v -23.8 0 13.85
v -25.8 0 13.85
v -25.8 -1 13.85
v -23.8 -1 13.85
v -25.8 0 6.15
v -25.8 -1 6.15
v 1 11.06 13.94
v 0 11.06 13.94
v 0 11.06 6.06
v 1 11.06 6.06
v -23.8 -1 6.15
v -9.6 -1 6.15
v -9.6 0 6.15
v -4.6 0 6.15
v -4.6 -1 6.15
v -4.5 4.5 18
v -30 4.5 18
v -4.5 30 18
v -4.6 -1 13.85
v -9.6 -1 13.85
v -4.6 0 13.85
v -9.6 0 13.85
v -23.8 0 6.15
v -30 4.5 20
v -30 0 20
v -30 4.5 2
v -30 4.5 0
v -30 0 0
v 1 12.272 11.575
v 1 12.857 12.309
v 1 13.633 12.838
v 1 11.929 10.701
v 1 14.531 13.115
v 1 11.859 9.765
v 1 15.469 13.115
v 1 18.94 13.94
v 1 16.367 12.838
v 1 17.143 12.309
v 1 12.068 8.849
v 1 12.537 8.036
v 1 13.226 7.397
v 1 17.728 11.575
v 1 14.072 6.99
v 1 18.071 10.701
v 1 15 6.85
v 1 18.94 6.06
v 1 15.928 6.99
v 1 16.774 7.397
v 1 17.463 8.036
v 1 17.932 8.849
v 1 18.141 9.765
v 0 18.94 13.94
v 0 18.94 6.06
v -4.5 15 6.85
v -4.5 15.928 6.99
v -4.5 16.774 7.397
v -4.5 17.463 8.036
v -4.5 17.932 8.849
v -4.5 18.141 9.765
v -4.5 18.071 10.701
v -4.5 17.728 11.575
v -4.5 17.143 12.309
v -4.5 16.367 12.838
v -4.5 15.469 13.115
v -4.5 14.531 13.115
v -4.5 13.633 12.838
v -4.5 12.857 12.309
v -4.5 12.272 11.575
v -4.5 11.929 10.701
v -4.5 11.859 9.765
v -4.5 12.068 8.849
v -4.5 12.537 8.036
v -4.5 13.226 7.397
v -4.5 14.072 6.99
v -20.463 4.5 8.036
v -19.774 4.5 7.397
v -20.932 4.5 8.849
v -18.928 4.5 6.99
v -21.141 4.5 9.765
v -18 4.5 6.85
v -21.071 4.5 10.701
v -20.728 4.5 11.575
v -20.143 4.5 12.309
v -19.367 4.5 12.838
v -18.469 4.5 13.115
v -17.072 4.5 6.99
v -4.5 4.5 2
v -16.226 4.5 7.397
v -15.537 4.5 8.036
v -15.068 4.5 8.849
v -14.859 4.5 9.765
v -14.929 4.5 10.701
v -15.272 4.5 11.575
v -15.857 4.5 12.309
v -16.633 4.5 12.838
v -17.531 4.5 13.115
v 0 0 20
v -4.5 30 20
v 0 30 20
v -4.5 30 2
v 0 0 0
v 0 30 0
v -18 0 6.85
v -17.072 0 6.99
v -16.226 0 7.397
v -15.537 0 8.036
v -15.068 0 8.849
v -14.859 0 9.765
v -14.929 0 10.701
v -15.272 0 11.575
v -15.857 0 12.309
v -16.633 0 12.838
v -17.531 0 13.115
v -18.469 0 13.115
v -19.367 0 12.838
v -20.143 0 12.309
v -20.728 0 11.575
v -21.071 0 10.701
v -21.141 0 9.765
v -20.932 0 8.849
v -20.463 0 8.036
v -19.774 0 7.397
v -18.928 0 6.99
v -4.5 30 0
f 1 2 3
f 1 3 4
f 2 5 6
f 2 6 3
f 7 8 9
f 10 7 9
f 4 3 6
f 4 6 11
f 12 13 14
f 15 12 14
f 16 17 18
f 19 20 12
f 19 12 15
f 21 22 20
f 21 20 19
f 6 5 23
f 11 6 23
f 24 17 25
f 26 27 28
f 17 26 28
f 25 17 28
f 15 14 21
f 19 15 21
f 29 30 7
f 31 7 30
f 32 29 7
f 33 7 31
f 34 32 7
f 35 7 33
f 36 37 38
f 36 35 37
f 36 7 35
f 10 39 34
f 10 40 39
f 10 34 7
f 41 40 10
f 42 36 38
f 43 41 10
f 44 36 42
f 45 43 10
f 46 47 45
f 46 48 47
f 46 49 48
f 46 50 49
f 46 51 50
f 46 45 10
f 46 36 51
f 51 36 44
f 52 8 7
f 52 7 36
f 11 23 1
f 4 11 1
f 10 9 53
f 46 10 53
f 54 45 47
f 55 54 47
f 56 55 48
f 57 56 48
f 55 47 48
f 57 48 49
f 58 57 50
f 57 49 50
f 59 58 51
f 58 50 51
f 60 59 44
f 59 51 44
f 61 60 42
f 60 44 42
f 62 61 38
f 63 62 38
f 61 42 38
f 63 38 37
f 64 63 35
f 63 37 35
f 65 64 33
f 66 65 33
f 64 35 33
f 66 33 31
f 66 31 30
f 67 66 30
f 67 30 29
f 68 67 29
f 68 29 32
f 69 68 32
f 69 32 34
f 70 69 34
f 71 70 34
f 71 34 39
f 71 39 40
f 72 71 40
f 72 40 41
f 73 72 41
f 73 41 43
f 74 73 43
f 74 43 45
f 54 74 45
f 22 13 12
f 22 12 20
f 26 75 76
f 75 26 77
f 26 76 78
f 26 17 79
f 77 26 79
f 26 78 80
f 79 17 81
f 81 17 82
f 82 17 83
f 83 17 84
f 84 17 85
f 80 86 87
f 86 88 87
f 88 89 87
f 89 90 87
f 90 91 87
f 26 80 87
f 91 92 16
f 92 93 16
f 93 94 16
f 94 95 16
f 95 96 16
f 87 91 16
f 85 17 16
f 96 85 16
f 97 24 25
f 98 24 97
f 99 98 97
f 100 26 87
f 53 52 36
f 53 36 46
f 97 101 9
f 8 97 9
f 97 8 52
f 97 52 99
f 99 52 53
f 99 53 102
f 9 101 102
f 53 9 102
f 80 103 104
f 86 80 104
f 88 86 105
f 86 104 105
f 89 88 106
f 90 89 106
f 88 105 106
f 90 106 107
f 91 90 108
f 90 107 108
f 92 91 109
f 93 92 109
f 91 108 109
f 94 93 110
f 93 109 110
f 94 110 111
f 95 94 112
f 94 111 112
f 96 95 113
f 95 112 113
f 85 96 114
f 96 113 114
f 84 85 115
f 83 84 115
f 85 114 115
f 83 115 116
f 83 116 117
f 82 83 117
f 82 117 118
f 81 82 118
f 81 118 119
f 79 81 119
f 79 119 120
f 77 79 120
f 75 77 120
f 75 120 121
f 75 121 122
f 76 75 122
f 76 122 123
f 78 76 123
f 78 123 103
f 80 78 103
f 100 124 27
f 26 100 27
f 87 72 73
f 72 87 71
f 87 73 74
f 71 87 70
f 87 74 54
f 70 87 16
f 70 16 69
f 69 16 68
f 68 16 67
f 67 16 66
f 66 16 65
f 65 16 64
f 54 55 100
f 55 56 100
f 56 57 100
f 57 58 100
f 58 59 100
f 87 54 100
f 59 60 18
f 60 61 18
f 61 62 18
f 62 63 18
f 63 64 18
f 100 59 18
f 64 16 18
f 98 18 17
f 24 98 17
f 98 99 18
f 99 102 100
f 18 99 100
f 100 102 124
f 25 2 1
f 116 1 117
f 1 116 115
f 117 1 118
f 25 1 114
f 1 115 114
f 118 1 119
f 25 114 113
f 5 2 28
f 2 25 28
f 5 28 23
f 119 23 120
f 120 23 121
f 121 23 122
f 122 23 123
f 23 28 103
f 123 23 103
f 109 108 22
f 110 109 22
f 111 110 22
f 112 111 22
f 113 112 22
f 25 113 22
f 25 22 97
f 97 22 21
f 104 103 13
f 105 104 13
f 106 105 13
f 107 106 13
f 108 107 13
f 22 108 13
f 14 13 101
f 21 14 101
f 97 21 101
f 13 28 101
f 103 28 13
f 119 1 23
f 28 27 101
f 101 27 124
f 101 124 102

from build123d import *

# Parameters (mm, degrees)
BOSS_EXTRUDE1_DEPTH = 20
CUT_EXTRUDE1_START  = -2
CUT_EXTRUDE1_DEPTH  = 16
SKETCH3_W           = 7.88
SKETCH3_H           = 7.88
BOSS_EXTRUDE2_DEPTH = 1
SKETCH4_R           = 3.15
CUT_EXTRUDE2_DEPTH  = 48.549973712
SKETCH5_W           = 2
SKETCH5_H           = 7.7
SKETCH5_W_2         = 5
BOSS_EXTRUDE3_DEPTH = 1
SKETCH6_R           = 3.15
CUT_EXTRUDE3_DEPTH  = 47.904157598


with BuildPart() as part:
    # Sketch1 → Boss-Extrude1 (new body)
    with BuildSketch(Plane.XY):
        Polygon((0, 0), (0, 30), (-4.5, 30), (-30, 4.5), (-30, 0), align=None)
    extrude(amount=BOSS_EXTRUDE1_DEPTH)

    # Sketch2 → Cut-Extrude1 (cut)
    with BuildSketch(Plane.XY.offset(20).offset(CUT_EXTRUDE1_START)):
        Polygon((-30, 4.5), (-4.5, 4.5), (-4.5, 30), align=None)
    extrude(amount=-CUT_EXTRUDE1_DEPTH, mode=Mode.SUBTRACT)

    # Sketch3 → Boss-Extrude2 (add)
    with BuildSketch(Plane(origin=(0, 0, 0), x_dir=(0, 0, -1), z_dir=(1, 0, 0))):
        with Locations((-10, 15)):
            Rectangle(SKETCH3_W, SKETCH3_H)
    extrude(amount=BOSS_EXTRUDE2_DEPTH)

    # Sketch4 → Cut-Extrude2 (cut, through all)
    with BuildSketch(Plane(origin=(1, 0, 0), x_dir=(0, 0, -1), z_dir=(1, 0, 0))):
        with Locations((-10, 15)):
            Circle(SKETCH4_R)
    extrude(amount=-CUT_EXTRUDE2_DEPTH, mode=Mode.SUBTRACT)

    # Sketch5 → Boss-Extrude3 (add)
    with BuildSketch(Plane.XZ):
        with Locations((-24.8, 10)):
            Rectangle(SKETCH5_W, SKETCH5_H)
        with Locations((-7.1, 10)):
            Rectangle(SKETCH5_W_2, SKETCH5_H)
    extrude(amount=BOSS_EXTRUDE3_DEPTH)

    # Sketch6 → Cut-Extrude3 (cut, through all)
    with BuildSketch(Plane.XZ):
        with Locations(Location((-18, 10, 0), (0, 0, 270))):
            Circle(SKETCH6_R)
    extrude(amount=-CUT_EXTRUDE3_DEPTH, mode=Mode.SUBTRACT)


solid = part.part
